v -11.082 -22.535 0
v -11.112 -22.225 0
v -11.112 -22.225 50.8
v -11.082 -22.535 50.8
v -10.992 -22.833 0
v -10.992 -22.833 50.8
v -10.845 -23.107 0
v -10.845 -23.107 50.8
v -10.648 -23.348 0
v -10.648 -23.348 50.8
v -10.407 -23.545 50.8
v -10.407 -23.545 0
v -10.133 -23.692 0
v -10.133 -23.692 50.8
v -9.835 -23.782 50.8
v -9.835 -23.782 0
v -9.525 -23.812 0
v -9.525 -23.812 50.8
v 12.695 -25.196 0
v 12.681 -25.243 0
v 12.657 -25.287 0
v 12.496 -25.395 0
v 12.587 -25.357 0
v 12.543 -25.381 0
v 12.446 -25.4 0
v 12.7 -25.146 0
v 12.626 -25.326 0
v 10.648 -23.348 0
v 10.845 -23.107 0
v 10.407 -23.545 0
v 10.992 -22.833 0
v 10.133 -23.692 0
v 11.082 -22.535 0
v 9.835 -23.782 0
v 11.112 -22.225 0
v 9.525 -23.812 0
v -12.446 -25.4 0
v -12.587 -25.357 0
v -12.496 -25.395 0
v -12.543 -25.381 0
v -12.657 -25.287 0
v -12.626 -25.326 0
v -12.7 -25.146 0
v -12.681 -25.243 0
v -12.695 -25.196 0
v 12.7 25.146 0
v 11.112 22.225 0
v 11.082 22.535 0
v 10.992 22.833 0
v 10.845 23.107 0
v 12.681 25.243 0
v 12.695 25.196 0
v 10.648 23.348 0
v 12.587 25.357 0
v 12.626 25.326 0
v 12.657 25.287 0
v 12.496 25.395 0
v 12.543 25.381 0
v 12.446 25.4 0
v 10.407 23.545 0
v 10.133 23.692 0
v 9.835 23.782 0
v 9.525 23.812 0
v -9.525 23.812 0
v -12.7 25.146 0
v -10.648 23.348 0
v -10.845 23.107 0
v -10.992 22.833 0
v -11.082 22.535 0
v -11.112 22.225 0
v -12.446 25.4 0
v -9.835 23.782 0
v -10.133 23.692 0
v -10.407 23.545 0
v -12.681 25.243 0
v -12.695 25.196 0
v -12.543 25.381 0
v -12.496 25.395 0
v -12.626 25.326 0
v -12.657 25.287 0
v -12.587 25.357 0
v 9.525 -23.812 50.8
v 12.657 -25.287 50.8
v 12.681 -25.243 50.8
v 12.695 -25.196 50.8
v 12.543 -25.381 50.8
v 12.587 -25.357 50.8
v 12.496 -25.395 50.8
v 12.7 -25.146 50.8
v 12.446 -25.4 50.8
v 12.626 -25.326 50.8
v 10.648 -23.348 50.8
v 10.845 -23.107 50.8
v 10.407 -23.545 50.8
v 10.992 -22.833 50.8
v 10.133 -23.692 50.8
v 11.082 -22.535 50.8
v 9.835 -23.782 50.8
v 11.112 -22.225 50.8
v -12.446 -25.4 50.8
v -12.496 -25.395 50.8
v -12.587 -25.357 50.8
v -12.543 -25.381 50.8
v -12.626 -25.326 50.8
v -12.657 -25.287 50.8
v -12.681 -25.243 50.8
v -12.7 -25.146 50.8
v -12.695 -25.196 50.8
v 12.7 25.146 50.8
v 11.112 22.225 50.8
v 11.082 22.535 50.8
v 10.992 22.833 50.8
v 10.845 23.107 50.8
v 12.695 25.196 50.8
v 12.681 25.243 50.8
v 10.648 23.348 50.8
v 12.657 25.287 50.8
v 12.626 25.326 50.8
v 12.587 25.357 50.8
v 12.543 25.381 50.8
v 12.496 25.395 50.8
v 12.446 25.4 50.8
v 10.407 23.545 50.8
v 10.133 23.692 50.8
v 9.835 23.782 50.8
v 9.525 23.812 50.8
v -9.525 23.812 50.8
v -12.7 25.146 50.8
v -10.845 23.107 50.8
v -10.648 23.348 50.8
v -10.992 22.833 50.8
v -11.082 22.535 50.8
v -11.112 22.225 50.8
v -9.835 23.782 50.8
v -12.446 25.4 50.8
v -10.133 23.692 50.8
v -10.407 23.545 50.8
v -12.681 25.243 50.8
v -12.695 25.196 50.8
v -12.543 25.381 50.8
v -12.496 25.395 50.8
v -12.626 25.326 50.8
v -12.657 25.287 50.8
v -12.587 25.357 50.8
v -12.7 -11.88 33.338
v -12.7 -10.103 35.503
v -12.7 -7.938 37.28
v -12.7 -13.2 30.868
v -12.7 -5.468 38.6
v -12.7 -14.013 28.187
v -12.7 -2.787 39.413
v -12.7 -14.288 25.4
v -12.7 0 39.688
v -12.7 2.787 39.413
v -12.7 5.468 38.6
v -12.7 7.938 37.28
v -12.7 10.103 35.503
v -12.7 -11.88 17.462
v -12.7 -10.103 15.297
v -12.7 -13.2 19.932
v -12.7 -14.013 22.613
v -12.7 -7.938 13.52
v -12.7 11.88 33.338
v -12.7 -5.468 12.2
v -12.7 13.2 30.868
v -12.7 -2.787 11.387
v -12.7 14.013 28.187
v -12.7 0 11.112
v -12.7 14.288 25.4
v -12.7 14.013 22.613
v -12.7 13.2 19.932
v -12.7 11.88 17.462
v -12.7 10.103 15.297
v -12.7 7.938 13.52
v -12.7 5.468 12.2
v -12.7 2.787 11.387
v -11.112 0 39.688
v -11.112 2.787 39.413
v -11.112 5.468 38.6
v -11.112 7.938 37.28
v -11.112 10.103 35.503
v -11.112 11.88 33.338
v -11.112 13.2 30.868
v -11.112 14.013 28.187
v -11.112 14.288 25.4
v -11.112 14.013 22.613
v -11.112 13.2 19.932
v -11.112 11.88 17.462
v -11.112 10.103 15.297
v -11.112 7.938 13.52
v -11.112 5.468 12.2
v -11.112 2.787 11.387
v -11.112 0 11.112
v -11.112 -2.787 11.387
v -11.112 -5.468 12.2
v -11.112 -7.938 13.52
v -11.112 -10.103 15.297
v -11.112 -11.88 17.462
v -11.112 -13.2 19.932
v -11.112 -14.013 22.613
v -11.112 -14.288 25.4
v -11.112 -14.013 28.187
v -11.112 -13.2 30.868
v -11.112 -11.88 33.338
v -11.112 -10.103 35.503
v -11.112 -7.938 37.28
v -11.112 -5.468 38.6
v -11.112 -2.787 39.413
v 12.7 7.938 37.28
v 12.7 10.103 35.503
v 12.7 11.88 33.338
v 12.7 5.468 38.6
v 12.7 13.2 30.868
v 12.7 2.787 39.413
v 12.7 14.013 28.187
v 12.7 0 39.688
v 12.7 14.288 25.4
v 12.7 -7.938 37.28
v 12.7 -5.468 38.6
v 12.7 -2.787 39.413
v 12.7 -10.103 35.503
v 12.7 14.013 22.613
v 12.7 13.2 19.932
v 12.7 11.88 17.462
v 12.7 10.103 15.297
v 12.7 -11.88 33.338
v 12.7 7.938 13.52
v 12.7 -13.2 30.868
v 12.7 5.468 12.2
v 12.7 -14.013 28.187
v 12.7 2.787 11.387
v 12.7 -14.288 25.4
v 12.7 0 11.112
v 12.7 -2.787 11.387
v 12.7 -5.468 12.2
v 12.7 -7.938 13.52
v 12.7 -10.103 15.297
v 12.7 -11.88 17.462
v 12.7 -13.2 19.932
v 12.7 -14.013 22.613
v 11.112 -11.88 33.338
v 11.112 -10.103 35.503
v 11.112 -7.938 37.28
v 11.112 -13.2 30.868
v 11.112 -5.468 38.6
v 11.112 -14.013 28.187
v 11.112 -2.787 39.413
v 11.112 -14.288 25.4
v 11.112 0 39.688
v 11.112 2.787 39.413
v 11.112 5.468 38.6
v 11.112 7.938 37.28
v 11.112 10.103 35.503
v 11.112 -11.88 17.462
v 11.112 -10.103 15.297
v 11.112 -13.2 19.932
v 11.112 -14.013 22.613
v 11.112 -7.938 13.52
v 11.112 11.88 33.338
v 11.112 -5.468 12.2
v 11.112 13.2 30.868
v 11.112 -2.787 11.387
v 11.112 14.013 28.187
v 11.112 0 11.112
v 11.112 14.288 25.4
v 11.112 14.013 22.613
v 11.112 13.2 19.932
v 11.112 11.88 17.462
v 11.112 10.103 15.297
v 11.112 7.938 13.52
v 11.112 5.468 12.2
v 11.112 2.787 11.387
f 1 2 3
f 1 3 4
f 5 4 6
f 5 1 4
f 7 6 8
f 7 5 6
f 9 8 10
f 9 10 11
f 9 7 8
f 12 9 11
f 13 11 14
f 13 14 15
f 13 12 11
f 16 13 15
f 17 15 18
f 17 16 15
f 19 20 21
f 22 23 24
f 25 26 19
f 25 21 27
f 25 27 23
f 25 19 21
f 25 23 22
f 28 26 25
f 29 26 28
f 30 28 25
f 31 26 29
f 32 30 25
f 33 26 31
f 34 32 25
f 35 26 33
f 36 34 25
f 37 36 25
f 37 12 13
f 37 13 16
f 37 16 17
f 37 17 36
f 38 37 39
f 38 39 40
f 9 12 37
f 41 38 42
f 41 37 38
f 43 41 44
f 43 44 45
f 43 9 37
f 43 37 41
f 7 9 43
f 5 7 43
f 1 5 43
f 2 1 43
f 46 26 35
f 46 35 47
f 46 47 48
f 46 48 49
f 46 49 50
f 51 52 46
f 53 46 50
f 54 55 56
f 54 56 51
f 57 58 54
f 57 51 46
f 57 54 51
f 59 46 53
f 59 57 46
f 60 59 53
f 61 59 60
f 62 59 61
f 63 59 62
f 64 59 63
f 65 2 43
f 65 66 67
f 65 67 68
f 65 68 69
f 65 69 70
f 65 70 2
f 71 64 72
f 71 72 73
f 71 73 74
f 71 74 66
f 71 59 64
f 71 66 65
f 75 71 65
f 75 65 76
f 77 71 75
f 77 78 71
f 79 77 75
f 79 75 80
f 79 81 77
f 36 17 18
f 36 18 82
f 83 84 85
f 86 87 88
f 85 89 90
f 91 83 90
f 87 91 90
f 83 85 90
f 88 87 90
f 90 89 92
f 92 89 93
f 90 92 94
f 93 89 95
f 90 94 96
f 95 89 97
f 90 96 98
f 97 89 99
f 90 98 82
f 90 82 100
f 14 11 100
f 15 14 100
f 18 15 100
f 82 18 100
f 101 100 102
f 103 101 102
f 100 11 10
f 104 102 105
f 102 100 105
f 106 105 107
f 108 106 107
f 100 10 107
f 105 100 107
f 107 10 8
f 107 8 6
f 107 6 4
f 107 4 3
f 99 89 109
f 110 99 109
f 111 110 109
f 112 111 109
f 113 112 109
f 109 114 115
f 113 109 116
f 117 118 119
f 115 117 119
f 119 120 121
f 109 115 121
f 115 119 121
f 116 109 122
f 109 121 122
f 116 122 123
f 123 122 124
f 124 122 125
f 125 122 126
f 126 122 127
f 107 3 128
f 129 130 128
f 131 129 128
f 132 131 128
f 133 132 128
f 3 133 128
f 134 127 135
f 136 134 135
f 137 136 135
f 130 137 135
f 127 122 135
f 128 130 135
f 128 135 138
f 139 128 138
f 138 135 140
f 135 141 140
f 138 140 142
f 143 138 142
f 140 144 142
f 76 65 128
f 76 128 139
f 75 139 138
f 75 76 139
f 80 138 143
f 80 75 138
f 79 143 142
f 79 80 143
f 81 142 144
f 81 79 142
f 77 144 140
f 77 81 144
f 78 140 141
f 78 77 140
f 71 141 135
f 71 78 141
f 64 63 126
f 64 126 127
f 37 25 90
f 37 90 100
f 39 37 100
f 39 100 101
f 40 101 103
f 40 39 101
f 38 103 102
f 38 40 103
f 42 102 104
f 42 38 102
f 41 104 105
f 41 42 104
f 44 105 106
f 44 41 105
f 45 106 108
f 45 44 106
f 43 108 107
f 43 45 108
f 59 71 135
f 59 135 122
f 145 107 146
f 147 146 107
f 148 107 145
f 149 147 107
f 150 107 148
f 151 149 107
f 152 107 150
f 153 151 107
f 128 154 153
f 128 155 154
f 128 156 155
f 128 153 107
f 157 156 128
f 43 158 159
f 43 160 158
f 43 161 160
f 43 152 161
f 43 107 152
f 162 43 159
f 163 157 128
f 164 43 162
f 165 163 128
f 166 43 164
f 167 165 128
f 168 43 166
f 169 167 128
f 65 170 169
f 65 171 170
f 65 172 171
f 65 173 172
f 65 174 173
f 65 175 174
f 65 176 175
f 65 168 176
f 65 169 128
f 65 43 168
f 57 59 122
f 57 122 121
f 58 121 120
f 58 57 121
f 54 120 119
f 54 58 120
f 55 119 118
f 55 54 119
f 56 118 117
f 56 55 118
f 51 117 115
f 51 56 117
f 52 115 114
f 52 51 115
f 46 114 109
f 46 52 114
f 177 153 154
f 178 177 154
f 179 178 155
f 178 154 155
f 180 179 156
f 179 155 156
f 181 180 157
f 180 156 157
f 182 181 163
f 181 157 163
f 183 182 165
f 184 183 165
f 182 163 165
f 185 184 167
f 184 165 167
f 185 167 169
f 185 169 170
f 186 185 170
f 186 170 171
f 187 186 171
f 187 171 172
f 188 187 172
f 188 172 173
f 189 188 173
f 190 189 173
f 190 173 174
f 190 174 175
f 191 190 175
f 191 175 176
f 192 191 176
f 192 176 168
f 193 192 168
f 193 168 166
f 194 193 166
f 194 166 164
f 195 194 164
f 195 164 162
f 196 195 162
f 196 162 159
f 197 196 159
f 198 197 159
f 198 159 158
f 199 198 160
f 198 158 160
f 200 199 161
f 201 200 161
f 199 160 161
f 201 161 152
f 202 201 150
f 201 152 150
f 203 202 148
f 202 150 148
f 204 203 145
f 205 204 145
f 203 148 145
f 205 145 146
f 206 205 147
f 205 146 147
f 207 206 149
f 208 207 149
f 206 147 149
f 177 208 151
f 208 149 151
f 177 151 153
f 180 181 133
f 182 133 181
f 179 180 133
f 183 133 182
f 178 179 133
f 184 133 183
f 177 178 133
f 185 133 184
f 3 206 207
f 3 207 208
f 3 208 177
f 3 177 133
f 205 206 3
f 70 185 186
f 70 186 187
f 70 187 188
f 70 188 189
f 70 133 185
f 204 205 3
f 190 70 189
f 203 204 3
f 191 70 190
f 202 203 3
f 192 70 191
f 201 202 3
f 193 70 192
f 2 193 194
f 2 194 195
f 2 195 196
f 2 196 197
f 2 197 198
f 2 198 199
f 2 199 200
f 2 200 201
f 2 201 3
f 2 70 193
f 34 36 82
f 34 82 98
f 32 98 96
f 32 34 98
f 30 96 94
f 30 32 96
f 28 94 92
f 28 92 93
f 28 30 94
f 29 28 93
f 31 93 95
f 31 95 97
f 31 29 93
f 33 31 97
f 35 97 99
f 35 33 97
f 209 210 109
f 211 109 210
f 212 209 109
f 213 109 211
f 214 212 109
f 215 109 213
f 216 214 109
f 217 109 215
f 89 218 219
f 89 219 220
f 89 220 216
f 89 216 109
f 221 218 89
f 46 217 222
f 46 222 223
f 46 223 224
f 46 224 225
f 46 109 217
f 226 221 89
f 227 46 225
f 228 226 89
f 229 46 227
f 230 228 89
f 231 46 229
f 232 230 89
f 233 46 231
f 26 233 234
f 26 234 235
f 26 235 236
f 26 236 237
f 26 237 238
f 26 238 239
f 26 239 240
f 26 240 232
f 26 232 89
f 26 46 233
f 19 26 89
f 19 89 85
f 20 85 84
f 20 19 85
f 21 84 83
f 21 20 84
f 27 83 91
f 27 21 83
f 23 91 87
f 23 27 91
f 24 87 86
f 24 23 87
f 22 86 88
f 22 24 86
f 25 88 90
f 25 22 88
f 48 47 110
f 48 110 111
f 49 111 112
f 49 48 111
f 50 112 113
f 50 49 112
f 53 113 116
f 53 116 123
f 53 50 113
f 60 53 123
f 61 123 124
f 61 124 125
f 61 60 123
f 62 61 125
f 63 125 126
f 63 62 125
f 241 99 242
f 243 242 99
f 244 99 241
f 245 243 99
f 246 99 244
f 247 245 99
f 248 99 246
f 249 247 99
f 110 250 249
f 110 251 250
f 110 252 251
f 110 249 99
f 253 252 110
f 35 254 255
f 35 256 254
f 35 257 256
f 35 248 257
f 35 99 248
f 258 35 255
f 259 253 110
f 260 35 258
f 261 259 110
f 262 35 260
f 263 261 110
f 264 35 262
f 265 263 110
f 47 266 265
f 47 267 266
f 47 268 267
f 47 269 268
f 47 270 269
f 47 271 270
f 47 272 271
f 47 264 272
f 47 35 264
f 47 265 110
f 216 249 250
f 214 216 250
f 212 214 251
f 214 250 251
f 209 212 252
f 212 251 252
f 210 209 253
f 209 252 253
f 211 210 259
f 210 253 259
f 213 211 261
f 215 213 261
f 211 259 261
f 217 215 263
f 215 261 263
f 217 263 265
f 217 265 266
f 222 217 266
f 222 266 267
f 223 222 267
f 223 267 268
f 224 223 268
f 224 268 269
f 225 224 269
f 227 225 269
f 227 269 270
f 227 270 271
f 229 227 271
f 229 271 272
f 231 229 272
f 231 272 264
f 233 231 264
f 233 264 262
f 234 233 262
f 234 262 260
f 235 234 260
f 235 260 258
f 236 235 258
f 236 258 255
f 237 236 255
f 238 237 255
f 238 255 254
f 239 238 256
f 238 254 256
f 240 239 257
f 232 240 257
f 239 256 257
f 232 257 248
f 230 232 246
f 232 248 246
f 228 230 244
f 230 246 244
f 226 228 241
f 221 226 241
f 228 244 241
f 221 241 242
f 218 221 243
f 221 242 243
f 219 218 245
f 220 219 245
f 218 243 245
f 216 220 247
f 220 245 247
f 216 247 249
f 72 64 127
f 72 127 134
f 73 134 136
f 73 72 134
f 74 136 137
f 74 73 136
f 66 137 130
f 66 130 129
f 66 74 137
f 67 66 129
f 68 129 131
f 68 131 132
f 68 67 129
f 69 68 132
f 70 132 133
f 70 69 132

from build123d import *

# Parameters (mm, degrees)
BOSS_EXTRUDE1_DEPTH = 50.8
SKETCH2_R           = 14.2875
CUT_EXTRUDE1_DEPTH  = 50.8


with BuildPart() as part:
    # Sketch1 → Boss-Extrude1 (new body)
    with BuildSketch(Plane(origin=(0, 0, 0), x_dir=(-1, 0, 0), z_dir=(0, 0, -1))):
        with BuildLine():
            Line((-12.7, 25.146), (-12.7, -25.146))
            ThreePointArc((-12.7, -25.146), (-12.625605122, -25.325605122), (-12.446, -25.4))
            Line((-12.446, -25.4), (12.446, -25.4))
            ThreePointArc((12.446, -25.4), (12.625605122, -25.325605122), (12.7, -25.146))
            Line((12.7, -25.146), (12.7, 25.146))
            ThreePointArc((12.7, 25.146), (12.625605122, 25.325605122), (12.446, 25.4))
            Line((12.446, 25.4), (-12.446, 25.4))
            ThreePointArc((-12.446, 25.4), (-12.625605122, 25.325605122), (-12.7, 25.146))
        make_face()
        with BuildLine():
            Line((-11.1125, -22.225), (-11.1125, 22.225))
            ThreePointArc((-11.1125, 22.225), (-10.647532015, 23.347532015), (-9.525, 23.8125))
            Line((-9.525, 23.8125), (9.525, 23.8125))
            ThreePointArc((9.525, 23.8125), (10.647532015, 23.347532015), (11.1125, 22.225))
            Line((11.1125, 22.225), (11.1125, -22.225))
            ThreePointArc((11.1125, -22.225), (10.647532015, -23.347532015), (9.525, -23.8125))
            Line((9.525, -23.8125), (-9.525, -23.8125))
            ThreePointArc((-9.525, -23.8125), (-10.647532015, -23.347532015), (-11.1125, -22.225))
        make_face(mode=Mode.SUBTRACT)
    extrude(amount=-BOSS_EXTRUDE1_DEPTH)

    # Sketch2 → Cut-Extrude1 (cut)
    with BuildSketch(Plane.ZY.offset(12.7)):
        with Locations((25.4, 0)):
            Circle(SKETCH2_R)
    extrude(amount=-CUT_EXTRUDE1_DEPTH, mode=Mode.SUBTRACT)


solid = part.part
